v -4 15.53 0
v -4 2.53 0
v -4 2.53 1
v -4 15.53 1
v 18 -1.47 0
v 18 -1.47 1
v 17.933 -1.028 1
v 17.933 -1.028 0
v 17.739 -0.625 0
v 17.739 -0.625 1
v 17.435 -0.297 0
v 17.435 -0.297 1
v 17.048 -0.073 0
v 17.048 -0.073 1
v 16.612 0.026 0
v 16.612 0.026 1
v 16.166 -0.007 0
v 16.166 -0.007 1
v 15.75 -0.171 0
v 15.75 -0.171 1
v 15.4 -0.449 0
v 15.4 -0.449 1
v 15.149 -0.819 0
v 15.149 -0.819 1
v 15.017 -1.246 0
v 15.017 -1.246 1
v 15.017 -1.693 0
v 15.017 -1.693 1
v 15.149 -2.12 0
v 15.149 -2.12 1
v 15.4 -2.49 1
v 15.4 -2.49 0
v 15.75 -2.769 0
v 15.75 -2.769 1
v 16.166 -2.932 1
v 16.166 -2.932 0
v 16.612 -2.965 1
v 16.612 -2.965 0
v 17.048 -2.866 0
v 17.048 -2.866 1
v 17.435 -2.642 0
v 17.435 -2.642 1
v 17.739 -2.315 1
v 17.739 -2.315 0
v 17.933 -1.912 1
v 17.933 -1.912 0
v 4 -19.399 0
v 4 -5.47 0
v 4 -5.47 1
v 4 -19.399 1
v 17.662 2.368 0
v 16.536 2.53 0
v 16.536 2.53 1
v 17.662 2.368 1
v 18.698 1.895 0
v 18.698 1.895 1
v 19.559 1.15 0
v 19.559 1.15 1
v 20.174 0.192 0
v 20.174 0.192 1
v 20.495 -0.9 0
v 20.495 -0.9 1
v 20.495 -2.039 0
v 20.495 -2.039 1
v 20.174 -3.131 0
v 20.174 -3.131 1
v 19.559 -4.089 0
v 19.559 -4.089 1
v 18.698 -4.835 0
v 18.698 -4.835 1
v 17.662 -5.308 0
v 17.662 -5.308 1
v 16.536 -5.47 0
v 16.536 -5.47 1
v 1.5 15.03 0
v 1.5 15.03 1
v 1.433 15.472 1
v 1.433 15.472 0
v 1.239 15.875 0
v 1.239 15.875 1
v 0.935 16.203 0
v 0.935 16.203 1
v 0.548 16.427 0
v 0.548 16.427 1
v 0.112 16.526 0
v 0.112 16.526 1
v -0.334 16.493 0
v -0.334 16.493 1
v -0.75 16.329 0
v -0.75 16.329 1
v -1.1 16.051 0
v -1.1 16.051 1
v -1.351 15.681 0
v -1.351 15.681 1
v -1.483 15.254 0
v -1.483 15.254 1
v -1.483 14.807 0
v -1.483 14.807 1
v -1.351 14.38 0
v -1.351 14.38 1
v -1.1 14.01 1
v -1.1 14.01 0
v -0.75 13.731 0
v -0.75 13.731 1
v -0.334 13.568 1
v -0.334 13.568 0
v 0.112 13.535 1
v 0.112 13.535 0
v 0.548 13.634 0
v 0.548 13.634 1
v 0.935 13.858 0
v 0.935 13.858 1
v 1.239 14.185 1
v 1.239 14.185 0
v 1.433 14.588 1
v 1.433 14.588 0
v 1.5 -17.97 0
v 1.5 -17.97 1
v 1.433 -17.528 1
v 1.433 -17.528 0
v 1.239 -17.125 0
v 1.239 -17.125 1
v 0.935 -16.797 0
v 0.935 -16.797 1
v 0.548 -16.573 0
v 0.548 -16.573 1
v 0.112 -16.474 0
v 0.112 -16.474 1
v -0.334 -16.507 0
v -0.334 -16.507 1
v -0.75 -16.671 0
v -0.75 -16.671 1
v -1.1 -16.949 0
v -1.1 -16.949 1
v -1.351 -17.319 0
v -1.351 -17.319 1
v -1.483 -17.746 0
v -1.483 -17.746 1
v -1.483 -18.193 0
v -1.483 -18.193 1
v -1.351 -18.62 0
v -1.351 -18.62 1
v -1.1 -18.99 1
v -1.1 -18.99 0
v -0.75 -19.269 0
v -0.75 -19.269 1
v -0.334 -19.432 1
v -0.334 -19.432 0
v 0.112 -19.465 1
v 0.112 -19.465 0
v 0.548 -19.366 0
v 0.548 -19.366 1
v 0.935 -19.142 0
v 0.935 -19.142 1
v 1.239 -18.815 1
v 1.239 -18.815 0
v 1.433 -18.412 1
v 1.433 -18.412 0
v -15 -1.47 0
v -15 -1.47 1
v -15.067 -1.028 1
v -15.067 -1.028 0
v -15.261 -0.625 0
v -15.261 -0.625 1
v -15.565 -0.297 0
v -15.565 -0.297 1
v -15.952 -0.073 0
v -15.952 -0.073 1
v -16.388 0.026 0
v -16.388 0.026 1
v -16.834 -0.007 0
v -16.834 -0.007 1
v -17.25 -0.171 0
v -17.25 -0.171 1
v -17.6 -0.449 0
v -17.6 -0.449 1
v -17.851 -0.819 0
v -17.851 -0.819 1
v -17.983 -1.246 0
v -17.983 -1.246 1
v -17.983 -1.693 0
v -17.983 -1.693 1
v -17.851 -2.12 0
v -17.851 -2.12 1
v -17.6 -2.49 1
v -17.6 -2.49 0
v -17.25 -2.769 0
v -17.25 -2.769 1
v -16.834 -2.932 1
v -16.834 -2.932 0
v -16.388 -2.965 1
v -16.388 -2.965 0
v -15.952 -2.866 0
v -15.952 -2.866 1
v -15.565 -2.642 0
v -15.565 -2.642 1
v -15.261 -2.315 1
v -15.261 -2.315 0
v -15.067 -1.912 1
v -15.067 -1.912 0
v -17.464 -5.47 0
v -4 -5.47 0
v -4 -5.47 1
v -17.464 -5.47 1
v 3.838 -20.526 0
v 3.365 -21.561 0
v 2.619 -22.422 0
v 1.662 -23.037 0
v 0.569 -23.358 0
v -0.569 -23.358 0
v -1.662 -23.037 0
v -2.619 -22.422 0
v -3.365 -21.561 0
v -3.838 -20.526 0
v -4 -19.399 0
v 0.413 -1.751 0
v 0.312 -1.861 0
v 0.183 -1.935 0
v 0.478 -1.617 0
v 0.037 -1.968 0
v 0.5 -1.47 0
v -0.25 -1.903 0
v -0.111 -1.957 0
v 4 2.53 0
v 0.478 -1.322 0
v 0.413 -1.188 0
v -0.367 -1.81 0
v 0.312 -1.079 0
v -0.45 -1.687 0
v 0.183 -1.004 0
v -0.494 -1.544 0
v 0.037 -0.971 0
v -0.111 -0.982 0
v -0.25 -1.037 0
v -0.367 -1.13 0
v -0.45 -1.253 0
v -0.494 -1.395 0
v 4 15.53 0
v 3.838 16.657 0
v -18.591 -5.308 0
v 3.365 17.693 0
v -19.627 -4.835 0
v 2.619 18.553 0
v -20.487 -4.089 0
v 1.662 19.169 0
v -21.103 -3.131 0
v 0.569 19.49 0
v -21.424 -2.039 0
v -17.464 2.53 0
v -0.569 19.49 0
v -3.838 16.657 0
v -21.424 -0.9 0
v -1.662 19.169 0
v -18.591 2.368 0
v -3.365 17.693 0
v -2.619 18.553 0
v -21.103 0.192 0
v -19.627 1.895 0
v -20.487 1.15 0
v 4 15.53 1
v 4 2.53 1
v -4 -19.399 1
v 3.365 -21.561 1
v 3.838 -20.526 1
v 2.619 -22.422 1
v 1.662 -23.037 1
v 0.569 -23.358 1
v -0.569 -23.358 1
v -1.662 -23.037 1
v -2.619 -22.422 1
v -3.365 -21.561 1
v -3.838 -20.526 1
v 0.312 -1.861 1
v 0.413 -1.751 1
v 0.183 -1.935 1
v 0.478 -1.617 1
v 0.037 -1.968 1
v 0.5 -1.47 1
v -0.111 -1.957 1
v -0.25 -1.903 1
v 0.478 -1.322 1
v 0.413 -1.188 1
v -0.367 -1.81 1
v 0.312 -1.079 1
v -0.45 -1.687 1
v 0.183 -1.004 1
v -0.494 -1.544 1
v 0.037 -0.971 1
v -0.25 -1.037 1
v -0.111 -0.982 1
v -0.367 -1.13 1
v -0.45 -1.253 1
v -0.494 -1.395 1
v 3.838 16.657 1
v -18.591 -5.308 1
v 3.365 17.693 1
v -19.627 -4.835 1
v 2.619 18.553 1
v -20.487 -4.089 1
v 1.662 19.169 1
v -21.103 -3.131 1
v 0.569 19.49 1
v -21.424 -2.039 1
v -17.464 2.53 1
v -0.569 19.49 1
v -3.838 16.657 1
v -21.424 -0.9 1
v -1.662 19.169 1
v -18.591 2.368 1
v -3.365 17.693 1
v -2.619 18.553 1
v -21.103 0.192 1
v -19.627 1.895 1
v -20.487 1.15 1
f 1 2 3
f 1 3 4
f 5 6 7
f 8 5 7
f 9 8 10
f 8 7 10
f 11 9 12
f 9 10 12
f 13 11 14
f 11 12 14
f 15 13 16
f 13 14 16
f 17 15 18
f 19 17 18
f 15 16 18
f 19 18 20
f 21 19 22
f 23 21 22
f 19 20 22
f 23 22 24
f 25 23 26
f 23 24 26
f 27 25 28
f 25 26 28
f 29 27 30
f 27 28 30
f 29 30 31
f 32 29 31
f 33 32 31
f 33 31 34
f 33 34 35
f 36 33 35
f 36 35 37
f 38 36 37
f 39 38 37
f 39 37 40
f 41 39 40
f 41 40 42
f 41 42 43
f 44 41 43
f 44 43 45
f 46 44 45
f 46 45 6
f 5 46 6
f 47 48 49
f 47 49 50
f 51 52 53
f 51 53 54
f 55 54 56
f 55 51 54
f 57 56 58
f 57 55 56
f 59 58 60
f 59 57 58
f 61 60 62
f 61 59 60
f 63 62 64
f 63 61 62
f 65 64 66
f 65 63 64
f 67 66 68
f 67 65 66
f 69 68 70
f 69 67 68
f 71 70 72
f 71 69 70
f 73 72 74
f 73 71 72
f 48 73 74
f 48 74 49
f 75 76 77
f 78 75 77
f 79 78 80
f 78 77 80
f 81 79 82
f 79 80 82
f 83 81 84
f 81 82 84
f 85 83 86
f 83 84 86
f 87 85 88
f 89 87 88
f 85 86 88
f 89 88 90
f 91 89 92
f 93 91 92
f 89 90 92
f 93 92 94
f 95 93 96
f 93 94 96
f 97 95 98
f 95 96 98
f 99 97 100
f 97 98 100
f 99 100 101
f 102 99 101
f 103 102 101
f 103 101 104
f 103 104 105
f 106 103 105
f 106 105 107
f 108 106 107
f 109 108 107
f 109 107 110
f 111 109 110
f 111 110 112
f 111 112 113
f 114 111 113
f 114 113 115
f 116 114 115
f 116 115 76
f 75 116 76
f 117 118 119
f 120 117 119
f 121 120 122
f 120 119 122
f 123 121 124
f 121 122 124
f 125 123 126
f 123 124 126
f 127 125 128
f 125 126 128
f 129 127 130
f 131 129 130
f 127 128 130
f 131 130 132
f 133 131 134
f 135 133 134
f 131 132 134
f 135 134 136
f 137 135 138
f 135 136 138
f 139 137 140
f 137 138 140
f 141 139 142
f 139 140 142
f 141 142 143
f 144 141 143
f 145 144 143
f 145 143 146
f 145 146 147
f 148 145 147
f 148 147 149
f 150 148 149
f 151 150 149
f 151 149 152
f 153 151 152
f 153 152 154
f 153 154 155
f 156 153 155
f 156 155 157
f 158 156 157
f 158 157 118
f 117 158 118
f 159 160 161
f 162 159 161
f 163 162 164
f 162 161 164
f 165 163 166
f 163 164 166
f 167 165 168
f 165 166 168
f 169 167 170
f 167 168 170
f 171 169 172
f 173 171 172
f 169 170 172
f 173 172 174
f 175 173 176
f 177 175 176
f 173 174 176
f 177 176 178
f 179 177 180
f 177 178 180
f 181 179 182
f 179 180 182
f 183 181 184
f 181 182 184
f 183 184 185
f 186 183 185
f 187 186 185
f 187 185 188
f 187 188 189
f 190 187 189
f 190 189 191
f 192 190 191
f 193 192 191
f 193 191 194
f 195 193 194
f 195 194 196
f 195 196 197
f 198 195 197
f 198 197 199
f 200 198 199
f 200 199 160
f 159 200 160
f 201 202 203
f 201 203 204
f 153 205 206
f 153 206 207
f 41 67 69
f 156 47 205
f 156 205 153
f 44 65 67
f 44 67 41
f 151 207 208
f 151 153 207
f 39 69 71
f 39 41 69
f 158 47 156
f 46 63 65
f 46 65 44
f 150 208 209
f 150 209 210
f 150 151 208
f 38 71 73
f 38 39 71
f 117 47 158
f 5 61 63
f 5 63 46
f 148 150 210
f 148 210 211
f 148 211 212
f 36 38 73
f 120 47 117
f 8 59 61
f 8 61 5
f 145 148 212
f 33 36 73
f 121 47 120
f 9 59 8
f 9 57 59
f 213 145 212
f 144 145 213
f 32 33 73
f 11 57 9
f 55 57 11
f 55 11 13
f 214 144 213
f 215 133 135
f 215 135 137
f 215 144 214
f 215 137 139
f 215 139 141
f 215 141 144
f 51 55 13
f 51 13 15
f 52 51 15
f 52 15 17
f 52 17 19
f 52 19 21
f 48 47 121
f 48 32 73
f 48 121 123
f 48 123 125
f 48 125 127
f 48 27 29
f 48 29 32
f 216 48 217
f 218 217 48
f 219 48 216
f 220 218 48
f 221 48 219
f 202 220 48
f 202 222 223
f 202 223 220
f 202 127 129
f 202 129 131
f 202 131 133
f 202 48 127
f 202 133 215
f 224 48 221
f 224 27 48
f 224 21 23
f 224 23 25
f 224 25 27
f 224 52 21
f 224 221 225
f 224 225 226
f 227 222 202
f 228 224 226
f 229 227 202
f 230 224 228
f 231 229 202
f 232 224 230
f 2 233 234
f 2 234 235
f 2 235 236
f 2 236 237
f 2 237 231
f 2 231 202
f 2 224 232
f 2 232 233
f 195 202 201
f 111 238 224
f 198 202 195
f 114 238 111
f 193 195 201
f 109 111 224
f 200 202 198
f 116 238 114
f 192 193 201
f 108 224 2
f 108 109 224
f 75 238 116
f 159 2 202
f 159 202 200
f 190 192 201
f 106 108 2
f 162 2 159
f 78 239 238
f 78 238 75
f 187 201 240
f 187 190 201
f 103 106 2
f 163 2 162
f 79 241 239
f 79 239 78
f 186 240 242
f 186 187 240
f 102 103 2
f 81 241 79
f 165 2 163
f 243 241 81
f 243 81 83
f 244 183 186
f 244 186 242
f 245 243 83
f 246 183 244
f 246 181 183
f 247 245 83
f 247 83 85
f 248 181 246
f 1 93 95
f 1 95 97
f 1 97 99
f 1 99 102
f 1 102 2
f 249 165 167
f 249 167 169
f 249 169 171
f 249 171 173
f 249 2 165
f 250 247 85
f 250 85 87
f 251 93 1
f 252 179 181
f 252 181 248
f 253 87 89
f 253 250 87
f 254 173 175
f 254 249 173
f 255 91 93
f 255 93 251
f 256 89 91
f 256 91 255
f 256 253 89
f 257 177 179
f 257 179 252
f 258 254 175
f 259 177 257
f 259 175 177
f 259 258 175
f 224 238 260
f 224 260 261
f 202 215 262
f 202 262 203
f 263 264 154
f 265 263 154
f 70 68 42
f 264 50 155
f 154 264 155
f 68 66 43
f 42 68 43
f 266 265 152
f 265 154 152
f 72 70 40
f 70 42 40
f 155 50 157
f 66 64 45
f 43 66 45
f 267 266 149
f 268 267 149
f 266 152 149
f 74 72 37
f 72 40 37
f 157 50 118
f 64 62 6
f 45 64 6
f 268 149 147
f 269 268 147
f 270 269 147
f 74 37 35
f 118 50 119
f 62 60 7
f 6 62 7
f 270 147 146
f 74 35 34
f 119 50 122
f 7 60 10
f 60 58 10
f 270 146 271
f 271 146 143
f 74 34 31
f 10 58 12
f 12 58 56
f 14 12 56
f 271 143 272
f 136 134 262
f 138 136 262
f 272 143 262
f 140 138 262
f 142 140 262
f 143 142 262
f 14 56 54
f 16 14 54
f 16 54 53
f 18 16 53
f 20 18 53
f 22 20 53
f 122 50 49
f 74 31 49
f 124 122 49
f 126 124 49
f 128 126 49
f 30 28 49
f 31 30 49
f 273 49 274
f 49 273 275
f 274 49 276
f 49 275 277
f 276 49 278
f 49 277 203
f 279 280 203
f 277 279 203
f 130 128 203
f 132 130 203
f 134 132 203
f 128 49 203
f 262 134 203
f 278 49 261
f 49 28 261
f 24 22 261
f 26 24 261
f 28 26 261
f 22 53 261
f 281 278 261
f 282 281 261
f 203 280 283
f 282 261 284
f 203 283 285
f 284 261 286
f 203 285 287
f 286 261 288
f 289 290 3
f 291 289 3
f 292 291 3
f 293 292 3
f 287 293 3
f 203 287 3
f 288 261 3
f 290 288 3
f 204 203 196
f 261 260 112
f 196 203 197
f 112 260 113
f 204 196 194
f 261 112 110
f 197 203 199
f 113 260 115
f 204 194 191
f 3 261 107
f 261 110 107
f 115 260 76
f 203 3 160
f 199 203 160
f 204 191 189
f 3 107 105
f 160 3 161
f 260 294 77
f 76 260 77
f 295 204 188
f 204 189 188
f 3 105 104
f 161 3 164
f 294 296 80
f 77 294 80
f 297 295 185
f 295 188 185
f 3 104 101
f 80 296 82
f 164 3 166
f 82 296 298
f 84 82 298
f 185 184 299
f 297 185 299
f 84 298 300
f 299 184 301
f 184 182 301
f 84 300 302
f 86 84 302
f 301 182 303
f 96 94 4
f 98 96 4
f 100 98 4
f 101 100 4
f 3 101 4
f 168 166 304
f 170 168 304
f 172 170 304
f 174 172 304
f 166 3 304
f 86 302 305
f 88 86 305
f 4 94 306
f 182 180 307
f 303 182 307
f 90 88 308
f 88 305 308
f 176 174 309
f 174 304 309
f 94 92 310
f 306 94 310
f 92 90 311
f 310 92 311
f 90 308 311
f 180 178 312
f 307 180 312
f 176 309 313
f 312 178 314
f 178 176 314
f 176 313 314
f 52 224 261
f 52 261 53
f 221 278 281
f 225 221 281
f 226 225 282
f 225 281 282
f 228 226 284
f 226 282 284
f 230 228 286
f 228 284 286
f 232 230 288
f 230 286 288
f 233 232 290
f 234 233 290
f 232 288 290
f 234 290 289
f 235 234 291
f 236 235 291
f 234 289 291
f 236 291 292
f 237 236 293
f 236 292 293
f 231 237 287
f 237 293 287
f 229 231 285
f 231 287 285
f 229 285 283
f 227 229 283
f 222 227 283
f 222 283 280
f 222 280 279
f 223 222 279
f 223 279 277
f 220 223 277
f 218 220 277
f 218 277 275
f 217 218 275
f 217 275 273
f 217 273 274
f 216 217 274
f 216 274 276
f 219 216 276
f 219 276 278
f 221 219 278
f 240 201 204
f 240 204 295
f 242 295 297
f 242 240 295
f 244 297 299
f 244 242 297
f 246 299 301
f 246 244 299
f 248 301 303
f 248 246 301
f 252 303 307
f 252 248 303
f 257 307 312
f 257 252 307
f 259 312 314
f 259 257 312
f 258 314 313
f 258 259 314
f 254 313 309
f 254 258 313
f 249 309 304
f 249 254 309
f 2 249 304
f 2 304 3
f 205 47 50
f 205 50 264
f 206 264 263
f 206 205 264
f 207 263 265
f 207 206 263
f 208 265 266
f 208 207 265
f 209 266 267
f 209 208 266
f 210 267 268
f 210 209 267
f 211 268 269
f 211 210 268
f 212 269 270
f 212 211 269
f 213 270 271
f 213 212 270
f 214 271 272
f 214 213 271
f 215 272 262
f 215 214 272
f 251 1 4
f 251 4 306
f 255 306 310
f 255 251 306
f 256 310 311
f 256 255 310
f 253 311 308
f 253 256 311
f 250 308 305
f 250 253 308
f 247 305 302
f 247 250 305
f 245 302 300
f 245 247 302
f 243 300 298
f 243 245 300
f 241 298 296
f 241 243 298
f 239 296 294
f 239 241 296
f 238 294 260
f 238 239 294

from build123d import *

# Parameters (mm, degrees)
BOSS_EXTRU_1_DEPTH      = 1
ESQUISSE2_R             = 1.5
ESQUISSE2_R_2           = 0.5
ENL_V_MAT_EXTRU_1_DEPTH = 18


with BuildPart() as part:
    # Esquisse1 → Boss.-Extru.1 (new body)
    with BuildSketch(Plane.XY):
        with BuildLine():
            Line((-4, 2.530340064), (-4, 15.530340064))
            ThreePointArc((-4, 15.530340064), (0, 19.530340064), (4, 15.530340064))
            Line((4, 15.530340064), (4, 2.530340064))
            Line((4, 2.530340064), (16.535533906, 2.530340064))
            ThreePointArc((16.535533906, 2.530340064), (20.535533906, -1.469659936), (16.535533906, -5.469659936))
            Line((16.535533906, -5.469659936), (4, -5.469659936))
            Line((4, -5.469659936), (4, -19.398592124))
            ThreePointArc((4, -19.398592124), (0, -23.398592124), (-4, -19.398592124))
            Line((-4, -19.398592124), (-4, -5.469659936))
            Line((-4, -5.469659936), (-17.464466094, -5.469659936))
            ThreePointArc((-17.464466094, -5.469659936), (-21.464466094, -1.469659936), (-17.464466094, 2.530340064))
            Line((-17.464466094, 2.530340064), (-4, 2.530340064))
        make_face()
    extrude(amount=BOSS_EXTRU_1_DEPTH)

    # Esquisse2 → Enlèv. mat.-Extru.1 (cut)
    with BuildSketch(Plane.XY.offset(1)):
        with Locations((0, 15.030340064)):
            Circle(ESQUISSE2_R)
        with Locations((16.5, -1.469659936)):
            Circle(ESQUISSE2_R)
        with Locations((0, -17.969659936)):
            Circle(ESQUISSE2_R)
        with Locations((-16.5, -1.469659936)):
            Circle(ESQUISSE2_R)
        with Locations((0, -1.469659936)):
            Circle(ESQUISSE2_R_2)
    extrude(amount=-ENL_V_MAT_EXTRU_1_DEPTH, mode=Mode.SUBTRACT)


solid = part.part
